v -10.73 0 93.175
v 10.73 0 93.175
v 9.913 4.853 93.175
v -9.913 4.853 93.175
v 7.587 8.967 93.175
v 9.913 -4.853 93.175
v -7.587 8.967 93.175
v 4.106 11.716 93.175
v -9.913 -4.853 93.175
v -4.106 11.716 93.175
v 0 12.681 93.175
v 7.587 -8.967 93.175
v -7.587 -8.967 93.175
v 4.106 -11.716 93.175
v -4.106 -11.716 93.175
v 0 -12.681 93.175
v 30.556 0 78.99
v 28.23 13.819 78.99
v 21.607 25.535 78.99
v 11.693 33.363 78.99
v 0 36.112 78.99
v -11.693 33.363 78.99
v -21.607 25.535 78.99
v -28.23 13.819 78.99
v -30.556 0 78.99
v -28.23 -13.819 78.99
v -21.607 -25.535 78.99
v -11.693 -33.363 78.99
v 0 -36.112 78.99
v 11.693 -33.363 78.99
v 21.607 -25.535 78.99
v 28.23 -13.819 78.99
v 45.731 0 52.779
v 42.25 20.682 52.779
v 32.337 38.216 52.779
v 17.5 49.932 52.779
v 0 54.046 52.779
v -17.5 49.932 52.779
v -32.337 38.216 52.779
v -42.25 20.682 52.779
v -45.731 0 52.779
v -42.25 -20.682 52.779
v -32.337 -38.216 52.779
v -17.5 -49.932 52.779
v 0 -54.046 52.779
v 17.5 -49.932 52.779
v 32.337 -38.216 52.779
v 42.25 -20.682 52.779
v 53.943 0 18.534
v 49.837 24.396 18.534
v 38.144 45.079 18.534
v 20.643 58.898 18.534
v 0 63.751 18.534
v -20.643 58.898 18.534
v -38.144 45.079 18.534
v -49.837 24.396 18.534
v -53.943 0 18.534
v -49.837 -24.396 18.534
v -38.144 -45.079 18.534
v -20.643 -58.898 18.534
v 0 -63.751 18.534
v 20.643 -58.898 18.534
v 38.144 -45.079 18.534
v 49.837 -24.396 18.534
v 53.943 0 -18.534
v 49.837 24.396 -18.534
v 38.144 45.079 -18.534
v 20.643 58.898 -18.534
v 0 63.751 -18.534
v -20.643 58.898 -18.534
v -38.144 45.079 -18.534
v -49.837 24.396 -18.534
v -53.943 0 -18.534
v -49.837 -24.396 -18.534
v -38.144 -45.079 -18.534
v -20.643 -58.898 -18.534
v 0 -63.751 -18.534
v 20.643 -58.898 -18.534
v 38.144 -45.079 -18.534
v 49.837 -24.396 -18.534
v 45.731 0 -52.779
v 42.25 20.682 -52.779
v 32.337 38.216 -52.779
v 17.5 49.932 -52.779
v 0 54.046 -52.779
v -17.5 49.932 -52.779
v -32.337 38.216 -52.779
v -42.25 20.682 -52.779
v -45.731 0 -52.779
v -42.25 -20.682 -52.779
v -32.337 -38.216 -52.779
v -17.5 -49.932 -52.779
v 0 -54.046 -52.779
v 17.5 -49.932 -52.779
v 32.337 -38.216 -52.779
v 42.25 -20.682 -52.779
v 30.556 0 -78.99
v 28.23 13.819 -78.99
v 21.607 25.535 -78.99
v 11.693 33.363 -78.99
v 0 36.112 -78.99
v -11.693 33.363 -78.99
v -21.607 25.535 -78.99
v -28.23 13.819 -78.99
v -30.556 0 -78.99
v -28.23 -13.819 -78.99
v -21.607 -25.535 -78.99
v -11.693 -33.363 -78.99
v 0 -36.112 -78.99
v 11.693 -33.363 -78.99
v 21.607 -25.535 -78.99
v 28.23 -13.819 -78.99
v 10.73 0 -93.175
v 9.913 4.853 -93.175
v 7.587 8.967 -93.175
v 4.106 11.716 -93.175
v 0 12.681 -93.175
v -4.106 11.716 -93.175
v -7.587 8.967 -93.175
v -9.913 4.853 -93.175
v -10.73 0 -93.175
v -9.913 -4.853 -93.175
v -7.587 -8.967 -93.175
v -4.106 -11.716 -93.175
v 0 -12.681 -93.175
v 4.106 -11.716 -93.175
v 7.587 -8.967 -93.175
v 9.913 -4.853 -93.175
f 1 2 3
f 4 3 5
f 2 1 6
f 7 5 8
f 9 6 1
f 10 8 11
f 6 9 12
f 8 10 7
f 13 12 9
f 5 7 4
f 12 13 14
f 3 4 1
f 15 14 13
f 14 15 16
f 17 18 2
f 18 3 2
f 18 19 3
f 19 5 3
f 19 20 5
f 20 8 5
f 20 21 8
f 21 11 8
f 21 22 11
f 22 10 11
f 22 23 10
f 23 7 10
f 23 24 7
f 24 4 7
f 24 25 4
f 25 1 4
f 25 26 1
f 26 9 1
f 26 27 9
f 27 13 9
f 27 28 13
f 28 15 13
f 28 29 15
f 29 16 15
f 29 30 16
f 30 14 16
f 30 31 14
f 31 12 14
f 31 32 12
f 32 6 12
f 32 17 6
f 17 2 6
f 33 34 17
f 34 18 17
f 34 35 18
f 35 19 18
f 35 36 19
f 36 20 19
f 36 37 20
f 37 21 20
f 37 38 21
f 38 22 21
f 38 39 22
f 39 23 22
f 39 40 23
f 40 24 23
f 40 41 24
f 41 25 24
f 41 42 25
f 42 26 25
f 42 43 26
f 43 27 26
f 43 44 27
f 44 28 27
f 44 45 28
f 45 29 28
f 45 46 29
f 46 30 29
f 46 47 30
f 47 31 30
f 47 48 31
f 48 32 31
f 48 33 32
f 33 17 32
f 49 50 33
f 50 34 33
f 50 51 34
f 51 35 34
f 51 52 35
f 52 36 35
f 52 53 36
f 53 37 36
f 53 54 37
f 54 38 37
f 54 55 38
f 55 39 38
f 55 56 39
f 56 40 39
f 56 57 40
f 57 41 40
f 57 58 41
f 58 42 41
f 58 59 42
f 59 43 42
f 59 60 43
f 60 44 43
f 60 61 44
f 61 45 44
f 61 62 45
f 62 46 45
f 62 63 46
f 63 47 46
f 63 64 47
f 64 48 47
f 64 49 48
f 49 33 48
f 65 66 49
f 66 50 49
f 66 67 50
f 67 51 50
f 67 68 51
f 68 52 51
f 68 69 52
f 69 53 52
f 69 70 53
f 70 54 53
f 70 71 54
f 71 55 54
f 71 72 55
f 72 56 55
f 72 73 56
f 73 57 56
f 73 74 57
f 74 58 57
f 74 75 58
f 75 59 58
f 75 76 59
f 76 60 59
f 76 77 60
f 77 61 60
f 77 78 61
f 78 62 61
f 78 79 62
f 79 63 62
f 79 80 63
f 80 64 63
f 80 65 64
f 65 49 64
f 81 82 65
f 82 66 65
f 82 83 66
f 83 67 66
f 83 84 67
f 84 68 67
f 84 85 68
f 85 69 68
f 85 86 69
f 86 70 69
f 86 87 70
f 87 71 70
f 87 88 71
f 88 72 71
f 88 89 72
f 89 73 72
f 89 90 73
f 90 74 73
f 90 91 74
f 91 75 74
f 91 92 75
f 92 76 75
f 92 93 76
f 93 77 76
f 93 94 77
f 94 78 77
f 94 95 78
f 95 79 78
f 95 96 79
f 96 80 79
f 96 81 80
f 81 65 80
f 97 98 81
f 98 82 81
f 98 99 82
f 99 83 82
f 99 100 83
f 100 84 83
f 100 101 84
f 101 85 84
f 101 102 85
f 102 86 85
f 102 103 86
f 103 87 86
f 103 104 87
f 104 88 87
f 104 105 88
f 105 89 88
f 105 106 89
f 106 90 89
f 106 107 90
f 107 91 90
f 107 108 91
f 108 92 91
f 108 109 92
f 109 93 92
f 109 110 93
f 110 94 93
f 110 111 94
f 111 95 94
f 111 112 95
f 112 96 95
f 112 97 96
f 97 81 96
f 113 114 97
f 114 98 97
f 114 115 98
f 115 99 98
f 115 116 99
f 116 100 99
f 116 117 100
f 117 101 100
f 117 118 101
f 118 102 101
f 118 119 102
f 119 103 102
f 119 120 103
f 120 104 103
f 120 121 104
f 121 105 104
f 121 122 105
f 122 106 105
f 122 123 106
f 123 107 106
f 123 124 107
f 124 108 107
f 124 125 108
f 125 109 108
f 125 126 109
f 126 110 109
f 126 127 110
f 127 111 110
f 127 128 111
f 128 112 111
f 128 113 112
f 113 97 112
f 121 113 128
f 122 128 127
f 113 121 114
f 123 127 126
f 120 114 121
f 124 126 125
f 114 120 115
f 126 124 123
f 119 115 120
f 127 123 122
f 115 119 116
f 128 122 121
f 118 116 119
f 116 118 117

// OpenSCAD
// Generated by SolidPython 1.0.1 on 2020-07-29 00:46:49


scale(v = [11, 13, 19]) {
	sphere(r = 5);
}
/***********************************************
*********      SolidPython code:      **********
************************************************
 
# import packages: SolidPython
from solid import *
from solid.utils import *
from itertools import chain, combinations, permutations


class Resize:

    def __init__(self, scad_file):
        self.scad_file = scad_file
        #self.scad_file = import_scad(scad_file)
        # cone/cylinder param:
        self.r1 = 0
        self.r2 = 0
        self.h = 0
        # rectangular prism param:
        self.w = 0
        self.l = 0
        # ellipse param:
        self.r = 0

    # import OpenScad code (file name corresponds to shape)


    # classify shape + parameters
    def assign(self, param1, param2, param3):
        if self.scad_file == 'cone.scad':
            self.r1 = param1
            self.r2 = param2
            self.h = param3
        elif self.scad_file == 'cylinder.scad':
            self.r1 = param1
            self.r2 = param2
            self.h = param3
        elif self.scad_file == 'rectangularPrism.scad':
            self.h = param1
            self.l = param2
            self.w = param3
        else:
            self.r = param1
            self.h = param2

    # resize parameters
    def iterate(self):
        x = range(3, 20, 2)
        i = 1
        if self.scad_file == 'cone.scad':
            tempList = list(permutations(x, 2))
            for temp in tempList:
                param1 = temp[0]
                param2 = temp[1]
                filepath = 'produced_scad_files/' + 'cone' + str(param1) + '_' + str(param2) + '_' + '.scad'
                scad_render_to_file(cylinder(h=param1, r1=param2, r2=0), filepath)

        elif self.scad_file == 'cylinder.scad':
            tempList = list(permutations(x, 3))
            for temp in tempList:
                param1 = temp[0]
                param2 = temp[1]
                filepath = 'produced_scad_files/' + 'cylinder' + str(param1) + '_' + str(param2) + '_' + '.scad'
                scad_render_to_file(cylinder(h=param1, r1=param2, r2=param2), filepath)

        elif self.scad_file == 'rectangularPrism.scad':
            tempList = list(permutations(x, 3))
            for temp in tempList:
                param1 = temp[0]
                param2 = temp[1]
                param3 = temp[2]
                filepath = 'produced_scad_files/' + 'rectangularPrism' + str(param1) + '_' + str(param2) + '_' + str(
                    param3) + '.scad'
                scad_render_to_file(cube(size=(param1, param2, param3)), filepath)

        elif self.scad_file == 'ellipse.scad':
            tempList = list(permutations(x, 4))
            for temp in tempList:
                param1 = temp[0]
                param2 = temp[1]
                param3 = temp[2]
                param4 = temp[3]
                filepath = 'produced_scad_files/' + 'ellipse' + str(param1) + '_' + str(param2) + '_' + str(param3) + '_' + str(param4) + '.scad'
                scad_render_to_file(scale([param1, param2, param3])(sphere(r=param4)), filepath)

    def render_to_scadfile(self):
        scad_render_to_file(scad, 'example.scad') 
 
************************************************/
